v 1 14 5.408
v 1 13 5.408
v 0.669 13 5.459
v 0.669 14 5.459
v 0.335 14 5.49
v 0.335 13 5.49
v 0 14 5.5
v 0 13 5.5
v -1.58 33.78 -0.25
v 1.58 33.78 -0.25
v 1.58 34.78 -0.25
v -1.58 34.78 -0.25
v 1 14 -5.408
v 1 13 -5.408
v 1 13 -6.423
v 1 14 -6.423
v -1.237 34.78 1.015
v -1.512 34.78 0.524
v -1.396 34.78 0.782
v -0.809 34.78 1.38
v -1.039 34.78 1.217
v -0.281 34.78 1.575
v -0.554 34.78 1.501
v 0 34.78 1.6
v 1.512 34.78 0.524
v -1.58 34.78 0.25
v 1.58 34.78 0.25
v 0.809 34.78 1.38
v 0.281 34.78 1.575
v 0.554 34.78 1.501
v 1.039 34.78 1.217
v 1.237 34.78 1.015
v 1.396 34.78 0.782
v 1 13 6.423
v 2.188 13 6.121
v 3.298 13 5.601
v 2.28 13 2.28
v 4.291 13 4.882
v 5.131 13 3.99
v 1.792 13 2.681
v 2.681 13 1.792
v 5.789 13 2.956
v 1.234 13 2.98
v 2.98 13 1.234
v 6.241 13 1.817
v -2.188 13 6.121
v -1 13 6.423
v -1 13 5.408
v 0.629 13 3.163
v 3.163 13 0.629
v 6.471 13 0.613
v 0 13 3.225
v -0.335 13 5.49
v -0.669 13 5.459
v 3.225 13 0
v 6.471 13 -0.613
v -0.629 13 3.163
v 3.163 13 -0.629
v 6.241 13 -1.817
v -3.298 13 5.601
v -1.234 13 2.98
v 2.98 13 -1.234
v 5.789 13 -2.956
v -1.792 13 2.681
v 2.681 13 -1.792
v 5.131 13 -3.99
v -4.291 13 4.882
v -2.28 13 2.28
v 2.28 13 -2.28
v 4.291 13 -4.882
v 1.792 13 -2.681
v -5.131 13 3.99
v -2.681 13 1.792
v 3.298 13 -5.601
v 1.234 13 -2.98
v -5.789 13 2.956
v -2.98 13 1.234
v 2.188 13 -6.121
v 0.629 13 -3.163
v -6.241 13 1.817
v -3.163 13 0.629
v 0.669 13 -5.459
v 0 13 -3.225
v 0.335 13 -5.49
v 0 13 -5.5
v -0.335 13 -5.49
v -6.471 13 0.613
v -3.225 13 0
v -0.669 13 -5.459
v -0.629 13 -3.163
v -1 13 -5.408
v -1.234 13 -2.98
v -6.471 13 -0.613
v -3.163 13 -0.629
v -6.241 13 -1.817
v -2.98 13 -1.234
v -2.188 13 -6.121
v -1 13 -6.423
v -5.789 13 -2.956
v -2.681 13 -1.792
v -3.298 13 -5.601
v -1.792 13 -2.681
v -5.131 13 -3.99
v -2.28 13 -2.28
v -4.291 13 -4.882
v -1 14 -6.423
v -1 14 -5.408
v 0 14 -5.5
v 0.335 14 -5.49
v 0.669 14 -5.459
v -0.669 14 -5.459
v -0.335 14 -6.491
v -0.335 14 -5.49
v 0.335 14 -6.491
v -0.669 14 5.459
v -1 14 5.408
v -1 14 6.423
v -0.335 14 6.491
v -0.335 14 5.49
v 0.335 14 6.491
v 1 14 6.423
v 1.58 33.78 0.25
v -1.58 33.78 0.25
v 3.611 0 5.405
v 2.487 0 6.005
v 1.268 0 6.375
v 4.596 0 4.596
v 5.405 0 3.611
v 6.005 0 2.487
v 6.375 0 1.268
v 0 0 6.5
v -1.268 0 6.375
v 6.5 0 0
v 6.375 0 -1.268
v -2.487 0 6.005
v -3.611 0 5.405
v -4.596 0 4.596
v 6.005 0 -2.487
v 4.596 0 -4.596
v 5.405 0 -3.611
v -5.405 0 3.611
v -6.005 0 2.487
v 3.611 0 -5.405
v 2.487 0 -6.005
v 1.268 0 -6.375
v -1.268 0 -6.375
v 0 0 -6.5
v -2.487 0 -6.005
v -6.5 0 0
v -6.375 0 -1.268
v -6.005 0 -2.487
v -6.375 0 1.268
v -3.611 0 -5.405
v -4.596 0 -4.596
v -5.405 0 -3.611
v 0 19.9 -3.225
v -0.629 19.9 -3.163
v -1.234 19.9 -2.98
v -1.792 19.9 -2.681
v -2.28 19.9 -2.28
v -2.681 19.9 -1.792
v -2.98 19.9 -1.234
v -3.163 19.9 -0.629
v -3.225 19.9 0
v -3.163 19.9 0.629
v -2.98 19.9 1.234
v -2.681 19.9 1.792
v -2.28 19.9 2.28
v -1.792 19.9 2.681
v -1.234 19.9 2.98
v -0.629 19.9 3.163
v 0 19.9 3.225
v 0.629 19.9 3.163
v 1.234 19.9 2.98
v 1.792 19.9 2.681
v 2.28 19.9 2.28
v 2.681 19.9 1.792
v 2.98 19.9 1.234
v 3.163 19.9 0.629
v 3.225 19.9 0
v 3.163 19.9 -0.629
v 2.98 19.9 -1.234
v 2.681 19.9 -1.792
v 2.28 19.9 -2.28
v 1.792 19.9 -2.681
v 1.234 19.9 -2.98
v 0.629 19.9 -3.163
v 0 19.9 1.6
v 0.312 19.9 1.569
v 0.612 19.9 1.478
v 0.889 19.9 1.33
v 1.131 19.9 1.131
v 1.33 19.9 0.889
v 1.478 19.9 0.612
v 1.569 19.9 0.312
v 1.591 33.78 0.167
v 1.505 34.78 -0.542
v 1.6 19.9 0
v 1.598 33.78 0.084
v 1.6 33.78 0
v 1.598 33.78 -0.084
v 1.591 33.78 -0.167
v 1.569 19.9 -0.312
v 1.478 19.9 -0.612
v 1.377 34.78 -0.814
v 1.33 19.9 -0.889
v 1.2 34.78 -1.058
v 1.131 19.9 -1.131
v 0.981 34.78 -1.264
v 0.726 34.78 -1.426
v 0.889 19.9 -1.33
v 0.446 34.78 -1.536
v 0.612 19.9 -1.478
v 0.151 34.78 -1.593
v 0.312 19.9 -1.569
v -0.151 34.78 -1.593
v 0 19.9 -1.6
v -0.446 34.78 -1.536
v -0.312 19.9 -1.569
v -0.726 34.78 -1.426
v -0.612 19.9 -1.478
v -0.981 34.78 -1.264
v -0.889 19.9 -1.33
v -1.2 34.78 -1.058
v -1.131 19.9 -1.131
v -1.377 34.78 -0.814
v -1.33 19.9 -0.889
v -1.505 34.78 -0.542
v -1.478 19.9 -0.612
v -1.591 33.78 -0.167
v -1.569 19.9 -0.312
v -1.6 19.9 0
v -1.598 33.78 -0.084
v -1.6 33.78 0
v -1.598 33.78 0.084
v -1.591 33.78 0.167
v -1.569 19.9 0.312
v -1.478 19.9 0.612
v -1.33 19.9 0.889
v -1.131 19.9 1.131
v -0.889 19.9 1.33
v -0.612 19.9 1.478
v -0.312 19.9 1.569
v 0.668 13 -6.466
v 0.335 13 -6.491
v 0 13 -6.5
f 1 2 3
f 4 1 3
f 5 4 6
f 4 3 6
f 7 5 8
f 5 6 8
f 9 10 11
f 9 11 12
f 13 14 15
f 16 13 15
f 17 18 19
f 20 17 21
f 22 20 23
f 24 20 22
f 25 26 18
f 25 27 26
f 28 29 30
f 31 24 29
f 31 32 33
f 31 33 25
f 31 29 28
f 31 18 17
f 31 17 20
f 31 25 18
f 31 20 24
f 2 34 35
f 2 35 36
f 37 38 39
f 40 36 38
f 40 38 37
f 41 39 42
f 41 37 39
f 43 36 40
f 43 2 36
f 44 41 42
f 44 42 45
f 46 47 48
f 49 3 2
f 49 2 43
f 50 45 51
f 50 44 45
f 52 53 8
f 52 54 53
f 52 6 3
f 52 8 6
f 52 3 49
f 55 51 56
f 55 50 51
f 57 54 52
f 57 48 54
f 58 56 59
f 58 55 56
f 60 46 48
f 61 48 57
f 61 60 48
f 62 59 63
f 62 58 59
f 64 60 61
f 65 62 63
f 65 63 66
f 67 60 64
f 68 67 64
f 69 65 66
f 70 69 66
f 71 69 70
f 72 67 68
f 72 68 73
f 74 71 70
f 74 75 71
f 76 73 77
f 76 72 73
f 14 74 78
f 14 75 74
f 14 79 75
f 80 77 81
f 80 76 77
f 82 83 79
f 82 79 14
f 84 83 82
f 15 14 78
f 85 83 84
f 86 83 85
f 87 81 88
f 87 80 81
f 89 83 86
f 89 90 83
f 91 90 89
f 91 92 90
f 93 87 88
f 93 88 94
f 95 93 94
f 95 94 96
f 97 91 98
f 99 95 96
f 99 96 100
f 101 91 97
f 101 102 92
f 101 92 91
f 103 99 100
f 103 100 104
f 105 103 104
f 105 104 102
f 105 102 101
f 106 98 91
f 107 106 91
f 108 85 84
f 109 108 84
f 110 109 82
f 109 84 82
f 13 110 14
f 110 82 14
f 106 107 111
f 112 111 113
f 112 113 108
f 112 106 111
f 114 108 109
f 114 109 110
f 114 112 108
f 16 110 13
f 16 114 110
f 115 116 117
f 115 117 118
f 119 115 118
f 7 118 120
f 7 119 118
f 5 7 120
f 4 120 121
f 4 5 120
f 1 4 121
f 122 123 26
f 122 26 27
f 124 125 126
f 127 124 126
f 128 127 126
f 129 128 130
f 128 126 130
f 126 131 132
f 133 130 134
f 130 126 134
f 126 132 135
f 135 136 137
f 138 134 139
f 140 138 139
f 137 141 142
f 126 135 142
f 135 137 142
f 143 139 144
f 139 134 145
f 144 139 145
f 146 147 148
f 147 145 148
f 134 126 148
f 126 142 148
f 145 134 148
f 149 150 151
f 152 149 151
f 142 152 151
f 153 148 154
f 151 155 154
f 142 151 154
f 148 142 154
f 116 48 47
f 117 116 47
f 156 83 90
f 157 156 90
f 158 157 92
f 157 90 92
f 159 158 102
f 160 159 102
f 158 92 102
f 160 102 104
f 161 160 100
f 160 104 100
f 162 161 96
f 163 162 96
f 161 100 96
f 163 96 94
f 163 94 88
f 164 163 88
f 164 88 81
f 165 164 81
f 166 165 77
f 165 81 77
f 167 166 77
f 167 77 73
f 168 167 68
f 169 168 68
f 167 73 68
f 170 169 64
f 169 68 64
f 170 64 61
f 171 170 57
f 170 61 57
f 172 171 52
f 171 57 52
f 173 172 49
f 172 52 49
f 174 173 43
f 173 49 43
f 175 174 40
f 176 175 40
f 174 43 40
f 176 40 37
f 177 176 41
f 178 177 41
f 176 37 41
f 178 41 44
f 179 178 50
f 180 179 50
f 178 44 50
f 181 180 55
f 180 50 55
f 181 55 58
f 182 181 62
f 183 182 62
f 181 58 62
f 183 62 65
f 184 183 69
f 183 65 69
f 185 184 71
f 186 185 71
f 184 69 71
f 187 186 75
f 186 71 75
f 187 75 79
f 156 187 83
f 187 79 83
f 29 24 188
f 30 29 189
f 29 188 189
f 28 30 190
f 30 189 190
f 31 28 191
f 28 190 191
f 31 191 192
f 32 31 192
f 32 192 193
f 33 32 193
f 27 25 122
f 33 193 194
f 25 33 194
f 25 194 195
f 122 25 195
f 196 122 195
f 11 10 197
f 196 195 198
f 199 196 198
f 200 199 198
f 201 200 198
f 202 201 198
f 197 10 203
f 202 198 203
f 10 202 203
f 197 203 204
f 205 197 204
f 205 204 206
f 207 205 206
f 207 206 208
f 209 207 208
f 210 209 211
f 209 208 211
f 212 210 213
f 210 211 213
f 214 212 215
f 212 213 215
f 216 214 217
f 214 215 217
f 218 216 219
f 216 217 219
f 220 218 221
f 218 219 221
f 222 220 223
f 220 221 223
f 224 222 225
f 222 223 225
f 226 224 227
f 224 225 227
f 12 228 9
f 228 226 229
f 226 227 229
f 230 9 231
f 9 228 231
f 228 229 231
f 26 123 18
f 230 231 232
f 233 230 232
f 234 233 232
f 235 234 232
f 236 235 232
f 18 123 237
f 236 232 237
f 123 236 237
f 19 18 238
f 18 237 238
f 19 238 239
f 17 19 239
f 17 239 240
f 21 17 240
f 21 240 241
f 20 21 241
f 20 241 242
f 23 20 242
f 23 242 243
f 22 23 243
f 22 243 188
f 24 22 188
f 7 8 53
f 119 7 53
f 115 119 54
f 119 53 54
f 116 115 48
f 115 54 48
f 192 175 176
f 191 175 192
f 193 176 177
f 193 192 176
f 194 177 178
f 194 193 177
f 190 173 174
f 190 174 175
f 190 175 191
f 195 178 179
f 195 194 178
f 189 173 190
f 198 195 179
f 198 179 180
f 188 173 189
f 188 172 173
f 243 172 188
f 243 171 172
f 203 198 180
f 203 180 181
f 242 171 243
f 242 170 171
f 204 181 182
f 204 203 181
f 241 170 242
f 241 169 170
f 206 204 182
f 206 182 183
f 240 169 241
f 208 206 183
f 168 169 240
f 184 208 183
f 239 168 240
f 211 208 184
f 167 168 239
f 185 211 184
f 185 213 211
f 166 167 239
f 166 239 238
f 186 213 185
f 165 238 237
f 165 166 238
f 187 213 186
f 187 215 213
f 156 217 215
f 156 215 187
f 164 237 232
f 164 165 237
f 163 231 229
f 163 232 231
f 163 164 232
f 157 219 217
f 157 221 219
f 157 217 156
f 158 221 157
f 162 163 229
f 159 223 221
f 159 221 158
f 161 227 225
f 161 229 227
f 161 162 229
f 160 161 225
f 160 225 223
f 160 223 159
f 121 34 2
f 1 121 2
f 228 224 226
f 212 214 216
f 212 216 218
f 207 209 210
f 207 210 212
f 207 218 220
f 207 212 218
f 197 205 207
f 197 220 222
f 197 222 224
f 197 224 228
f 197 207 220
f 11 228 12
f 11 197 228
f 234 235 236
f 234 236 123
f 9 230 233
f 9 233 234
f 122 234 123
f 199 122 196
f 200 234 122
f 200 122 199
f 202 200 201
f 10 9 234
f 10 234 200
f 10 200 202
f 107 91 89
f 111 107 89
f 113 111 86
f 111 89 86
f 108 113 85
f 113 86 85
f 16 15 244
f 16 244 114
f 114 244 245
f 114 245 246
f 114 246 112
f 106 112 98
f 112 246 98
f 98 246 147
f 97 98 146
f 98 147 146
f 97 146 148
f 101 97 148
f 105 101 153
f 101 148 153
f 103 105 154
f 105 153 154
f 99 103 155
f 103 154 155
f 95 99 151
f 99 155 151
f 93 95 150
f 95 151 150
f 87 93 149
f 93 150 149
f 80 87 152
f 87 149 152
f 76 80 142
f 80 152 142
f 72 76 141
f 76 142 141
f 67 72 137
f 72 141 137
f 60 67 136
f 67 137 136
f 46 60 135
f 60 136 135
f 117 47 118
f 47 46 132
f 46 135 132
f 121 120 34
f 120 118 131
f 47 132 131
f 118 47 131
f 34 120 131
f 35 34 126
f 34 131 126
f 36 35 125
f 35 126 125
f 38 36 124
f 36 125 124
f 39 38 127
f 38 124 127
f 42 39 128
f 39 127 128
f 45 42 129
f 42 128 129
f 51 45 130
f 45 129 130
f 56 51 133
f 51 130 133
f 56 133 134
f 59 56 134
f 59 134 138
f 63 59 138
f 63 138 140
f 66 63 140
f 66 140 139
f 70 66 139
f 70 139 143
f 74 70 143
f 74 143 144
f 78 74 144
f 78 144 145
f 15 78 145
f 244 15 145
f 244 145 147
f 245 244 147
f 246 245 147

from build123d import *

# Parameters (mm, degrees)
SKETCH1_R           = 6.5
BOSS_EXTRUDE1_DEPTH = 13
SKETCH2_R           = 3.225
BOSS_EXTRUDE2_DEPTH = 6.9
SKETCH3_R           = 1.6
BOSS_EXTRUDE3_DEPTH = 14.88
BOSS_EXTRUDE4_DEPTH = 1
CUT_EXTRUDE1_START  = -1
CUT_EXTRUDE1_DEPTH  = 1


with BuildPart() as part:
    # Sketch1 → Boss-Extrude1 (new body)
    with BuildSketch(Plane(origin=(0, 0, 0), x_dir=(1, 0, 0), z_dir=(0, 1, 0))):
        with Locations(Location((0, 0, 0), (0, 0, 90))):
            Circle(SKETCH1_R)
    extrude(amount=BOSS_EXTRUDE1_DEPTH)

    # Sketch2 → Boss-Extrude2 (add)
    with BuildSketch(Plane(origin=(0, 13, 0), x_dir=(1, 0, 0), z_dir=(0, 1, 0))):
        with Locations(Location((0, 0, 0), (0, 0, 90))):
            Circle(SKETCH2_R)
    extrude(amount=BOSS_EXTRUDE2_DEPTH)

    # Sketch3 → Boss-Extrude3 (add)
    with BuildSketch(Plane(origin=(0, 19.9, 0), x_dir=(1, 0, 0), z_dir=(0, 1, 0))):
        with Locations(Location((0, 0, 0), (0, 0, 270))):
            Circle(SKETCH3_R)
    extrude(amount=BOSS_EXTRUDE3_DEPTH)

    # Sketch4 → Boss-Extrude4 (add)
    with BuildSketch(Plane(origin=(0, 13, 0), x_dir=(1, 0, 0), z_dir=(0, 1, 0))):
        with BuildLine():
            ThreePointArc((-1, 5.408326913), (-0.502096593, 5.477033779), (0, 5.5))
            ThreePointArc((0, 5.5), (0.502096593, 5.477033779), (1, 5.408326913))
            Line((1, 5.408326913), (1, 5.5))
            Line((1, 5.5), (1, 6.422616289))
            ThreePointArc((1, 6.422616289), (0, 6.5), (-1, 6.422616289))
            Line((-1, 6.422616289), (-1, 5.5))
            Line((-1, 5.5), (-1, 5.408326913))
        make_face()
        with BuildLine():
            ThreePointArc((1, -5.408326913), (0.502096593, -5.477033779), (0, -5.5))
            ThreePointArc((0, -5.5), (-0.502096593, -5.477033779), (-1, -5.408326913))
            Line((-1, -5.408326913), (-1, -5.5))
            Line((-1, -5.5), (-1, -6.422616289))
            ThreePointArc((-1, -6.422616289), (0, -6.5), (1, -6.422616289))
            Line((1, -6.422616289), (1, -5.5))
            Line((1, -5.5), (1, -5.408326913))
        make_face()
    extrude(amount=BOSS_EXTRUDE4_DEPTH)

    # Sketch5 → Cut-Extrude1 (cut)
    with BuildSketch(Plane(origin=(0, 34.78, 0), x_dir=(1, 0, 0), z_dir=(0, 1, 0)).offset(CUT_EXTRUDE1_START)):
        with BuildLine():
            Line((-1.6, 0), (1.6, 0))
            ThreePointArc((1.6, 0), (1.59507945, 0.125385604), (1.580348063, 0.25))
            Line((1.580348063, 0.25), (-1.580348063, 0.25))
            ThreePointArc((-1.580348063, 0.25), (-1.59507945, 0.125385604), (-1.6, 0))
        make_face()
        with BuildLine():
            ThreePointArc((1.580348063, -0.25), (1.59507945, -0.125385604), (1.6, 0))
            Line((1.6, 0), (-1.6, 0))
            ThreePointArc((-1.6, 0), (-1.59507945, -0.125385604), (-1.580348063, -0.25))
            Line((-1.580348063, -0.25), (1.580348063, -0.25))
        make_face()
    extrude(amount=CUT_EXTRUDE1_DEPTH, mode=Mode.SUBTRACT)


solid = part.part
